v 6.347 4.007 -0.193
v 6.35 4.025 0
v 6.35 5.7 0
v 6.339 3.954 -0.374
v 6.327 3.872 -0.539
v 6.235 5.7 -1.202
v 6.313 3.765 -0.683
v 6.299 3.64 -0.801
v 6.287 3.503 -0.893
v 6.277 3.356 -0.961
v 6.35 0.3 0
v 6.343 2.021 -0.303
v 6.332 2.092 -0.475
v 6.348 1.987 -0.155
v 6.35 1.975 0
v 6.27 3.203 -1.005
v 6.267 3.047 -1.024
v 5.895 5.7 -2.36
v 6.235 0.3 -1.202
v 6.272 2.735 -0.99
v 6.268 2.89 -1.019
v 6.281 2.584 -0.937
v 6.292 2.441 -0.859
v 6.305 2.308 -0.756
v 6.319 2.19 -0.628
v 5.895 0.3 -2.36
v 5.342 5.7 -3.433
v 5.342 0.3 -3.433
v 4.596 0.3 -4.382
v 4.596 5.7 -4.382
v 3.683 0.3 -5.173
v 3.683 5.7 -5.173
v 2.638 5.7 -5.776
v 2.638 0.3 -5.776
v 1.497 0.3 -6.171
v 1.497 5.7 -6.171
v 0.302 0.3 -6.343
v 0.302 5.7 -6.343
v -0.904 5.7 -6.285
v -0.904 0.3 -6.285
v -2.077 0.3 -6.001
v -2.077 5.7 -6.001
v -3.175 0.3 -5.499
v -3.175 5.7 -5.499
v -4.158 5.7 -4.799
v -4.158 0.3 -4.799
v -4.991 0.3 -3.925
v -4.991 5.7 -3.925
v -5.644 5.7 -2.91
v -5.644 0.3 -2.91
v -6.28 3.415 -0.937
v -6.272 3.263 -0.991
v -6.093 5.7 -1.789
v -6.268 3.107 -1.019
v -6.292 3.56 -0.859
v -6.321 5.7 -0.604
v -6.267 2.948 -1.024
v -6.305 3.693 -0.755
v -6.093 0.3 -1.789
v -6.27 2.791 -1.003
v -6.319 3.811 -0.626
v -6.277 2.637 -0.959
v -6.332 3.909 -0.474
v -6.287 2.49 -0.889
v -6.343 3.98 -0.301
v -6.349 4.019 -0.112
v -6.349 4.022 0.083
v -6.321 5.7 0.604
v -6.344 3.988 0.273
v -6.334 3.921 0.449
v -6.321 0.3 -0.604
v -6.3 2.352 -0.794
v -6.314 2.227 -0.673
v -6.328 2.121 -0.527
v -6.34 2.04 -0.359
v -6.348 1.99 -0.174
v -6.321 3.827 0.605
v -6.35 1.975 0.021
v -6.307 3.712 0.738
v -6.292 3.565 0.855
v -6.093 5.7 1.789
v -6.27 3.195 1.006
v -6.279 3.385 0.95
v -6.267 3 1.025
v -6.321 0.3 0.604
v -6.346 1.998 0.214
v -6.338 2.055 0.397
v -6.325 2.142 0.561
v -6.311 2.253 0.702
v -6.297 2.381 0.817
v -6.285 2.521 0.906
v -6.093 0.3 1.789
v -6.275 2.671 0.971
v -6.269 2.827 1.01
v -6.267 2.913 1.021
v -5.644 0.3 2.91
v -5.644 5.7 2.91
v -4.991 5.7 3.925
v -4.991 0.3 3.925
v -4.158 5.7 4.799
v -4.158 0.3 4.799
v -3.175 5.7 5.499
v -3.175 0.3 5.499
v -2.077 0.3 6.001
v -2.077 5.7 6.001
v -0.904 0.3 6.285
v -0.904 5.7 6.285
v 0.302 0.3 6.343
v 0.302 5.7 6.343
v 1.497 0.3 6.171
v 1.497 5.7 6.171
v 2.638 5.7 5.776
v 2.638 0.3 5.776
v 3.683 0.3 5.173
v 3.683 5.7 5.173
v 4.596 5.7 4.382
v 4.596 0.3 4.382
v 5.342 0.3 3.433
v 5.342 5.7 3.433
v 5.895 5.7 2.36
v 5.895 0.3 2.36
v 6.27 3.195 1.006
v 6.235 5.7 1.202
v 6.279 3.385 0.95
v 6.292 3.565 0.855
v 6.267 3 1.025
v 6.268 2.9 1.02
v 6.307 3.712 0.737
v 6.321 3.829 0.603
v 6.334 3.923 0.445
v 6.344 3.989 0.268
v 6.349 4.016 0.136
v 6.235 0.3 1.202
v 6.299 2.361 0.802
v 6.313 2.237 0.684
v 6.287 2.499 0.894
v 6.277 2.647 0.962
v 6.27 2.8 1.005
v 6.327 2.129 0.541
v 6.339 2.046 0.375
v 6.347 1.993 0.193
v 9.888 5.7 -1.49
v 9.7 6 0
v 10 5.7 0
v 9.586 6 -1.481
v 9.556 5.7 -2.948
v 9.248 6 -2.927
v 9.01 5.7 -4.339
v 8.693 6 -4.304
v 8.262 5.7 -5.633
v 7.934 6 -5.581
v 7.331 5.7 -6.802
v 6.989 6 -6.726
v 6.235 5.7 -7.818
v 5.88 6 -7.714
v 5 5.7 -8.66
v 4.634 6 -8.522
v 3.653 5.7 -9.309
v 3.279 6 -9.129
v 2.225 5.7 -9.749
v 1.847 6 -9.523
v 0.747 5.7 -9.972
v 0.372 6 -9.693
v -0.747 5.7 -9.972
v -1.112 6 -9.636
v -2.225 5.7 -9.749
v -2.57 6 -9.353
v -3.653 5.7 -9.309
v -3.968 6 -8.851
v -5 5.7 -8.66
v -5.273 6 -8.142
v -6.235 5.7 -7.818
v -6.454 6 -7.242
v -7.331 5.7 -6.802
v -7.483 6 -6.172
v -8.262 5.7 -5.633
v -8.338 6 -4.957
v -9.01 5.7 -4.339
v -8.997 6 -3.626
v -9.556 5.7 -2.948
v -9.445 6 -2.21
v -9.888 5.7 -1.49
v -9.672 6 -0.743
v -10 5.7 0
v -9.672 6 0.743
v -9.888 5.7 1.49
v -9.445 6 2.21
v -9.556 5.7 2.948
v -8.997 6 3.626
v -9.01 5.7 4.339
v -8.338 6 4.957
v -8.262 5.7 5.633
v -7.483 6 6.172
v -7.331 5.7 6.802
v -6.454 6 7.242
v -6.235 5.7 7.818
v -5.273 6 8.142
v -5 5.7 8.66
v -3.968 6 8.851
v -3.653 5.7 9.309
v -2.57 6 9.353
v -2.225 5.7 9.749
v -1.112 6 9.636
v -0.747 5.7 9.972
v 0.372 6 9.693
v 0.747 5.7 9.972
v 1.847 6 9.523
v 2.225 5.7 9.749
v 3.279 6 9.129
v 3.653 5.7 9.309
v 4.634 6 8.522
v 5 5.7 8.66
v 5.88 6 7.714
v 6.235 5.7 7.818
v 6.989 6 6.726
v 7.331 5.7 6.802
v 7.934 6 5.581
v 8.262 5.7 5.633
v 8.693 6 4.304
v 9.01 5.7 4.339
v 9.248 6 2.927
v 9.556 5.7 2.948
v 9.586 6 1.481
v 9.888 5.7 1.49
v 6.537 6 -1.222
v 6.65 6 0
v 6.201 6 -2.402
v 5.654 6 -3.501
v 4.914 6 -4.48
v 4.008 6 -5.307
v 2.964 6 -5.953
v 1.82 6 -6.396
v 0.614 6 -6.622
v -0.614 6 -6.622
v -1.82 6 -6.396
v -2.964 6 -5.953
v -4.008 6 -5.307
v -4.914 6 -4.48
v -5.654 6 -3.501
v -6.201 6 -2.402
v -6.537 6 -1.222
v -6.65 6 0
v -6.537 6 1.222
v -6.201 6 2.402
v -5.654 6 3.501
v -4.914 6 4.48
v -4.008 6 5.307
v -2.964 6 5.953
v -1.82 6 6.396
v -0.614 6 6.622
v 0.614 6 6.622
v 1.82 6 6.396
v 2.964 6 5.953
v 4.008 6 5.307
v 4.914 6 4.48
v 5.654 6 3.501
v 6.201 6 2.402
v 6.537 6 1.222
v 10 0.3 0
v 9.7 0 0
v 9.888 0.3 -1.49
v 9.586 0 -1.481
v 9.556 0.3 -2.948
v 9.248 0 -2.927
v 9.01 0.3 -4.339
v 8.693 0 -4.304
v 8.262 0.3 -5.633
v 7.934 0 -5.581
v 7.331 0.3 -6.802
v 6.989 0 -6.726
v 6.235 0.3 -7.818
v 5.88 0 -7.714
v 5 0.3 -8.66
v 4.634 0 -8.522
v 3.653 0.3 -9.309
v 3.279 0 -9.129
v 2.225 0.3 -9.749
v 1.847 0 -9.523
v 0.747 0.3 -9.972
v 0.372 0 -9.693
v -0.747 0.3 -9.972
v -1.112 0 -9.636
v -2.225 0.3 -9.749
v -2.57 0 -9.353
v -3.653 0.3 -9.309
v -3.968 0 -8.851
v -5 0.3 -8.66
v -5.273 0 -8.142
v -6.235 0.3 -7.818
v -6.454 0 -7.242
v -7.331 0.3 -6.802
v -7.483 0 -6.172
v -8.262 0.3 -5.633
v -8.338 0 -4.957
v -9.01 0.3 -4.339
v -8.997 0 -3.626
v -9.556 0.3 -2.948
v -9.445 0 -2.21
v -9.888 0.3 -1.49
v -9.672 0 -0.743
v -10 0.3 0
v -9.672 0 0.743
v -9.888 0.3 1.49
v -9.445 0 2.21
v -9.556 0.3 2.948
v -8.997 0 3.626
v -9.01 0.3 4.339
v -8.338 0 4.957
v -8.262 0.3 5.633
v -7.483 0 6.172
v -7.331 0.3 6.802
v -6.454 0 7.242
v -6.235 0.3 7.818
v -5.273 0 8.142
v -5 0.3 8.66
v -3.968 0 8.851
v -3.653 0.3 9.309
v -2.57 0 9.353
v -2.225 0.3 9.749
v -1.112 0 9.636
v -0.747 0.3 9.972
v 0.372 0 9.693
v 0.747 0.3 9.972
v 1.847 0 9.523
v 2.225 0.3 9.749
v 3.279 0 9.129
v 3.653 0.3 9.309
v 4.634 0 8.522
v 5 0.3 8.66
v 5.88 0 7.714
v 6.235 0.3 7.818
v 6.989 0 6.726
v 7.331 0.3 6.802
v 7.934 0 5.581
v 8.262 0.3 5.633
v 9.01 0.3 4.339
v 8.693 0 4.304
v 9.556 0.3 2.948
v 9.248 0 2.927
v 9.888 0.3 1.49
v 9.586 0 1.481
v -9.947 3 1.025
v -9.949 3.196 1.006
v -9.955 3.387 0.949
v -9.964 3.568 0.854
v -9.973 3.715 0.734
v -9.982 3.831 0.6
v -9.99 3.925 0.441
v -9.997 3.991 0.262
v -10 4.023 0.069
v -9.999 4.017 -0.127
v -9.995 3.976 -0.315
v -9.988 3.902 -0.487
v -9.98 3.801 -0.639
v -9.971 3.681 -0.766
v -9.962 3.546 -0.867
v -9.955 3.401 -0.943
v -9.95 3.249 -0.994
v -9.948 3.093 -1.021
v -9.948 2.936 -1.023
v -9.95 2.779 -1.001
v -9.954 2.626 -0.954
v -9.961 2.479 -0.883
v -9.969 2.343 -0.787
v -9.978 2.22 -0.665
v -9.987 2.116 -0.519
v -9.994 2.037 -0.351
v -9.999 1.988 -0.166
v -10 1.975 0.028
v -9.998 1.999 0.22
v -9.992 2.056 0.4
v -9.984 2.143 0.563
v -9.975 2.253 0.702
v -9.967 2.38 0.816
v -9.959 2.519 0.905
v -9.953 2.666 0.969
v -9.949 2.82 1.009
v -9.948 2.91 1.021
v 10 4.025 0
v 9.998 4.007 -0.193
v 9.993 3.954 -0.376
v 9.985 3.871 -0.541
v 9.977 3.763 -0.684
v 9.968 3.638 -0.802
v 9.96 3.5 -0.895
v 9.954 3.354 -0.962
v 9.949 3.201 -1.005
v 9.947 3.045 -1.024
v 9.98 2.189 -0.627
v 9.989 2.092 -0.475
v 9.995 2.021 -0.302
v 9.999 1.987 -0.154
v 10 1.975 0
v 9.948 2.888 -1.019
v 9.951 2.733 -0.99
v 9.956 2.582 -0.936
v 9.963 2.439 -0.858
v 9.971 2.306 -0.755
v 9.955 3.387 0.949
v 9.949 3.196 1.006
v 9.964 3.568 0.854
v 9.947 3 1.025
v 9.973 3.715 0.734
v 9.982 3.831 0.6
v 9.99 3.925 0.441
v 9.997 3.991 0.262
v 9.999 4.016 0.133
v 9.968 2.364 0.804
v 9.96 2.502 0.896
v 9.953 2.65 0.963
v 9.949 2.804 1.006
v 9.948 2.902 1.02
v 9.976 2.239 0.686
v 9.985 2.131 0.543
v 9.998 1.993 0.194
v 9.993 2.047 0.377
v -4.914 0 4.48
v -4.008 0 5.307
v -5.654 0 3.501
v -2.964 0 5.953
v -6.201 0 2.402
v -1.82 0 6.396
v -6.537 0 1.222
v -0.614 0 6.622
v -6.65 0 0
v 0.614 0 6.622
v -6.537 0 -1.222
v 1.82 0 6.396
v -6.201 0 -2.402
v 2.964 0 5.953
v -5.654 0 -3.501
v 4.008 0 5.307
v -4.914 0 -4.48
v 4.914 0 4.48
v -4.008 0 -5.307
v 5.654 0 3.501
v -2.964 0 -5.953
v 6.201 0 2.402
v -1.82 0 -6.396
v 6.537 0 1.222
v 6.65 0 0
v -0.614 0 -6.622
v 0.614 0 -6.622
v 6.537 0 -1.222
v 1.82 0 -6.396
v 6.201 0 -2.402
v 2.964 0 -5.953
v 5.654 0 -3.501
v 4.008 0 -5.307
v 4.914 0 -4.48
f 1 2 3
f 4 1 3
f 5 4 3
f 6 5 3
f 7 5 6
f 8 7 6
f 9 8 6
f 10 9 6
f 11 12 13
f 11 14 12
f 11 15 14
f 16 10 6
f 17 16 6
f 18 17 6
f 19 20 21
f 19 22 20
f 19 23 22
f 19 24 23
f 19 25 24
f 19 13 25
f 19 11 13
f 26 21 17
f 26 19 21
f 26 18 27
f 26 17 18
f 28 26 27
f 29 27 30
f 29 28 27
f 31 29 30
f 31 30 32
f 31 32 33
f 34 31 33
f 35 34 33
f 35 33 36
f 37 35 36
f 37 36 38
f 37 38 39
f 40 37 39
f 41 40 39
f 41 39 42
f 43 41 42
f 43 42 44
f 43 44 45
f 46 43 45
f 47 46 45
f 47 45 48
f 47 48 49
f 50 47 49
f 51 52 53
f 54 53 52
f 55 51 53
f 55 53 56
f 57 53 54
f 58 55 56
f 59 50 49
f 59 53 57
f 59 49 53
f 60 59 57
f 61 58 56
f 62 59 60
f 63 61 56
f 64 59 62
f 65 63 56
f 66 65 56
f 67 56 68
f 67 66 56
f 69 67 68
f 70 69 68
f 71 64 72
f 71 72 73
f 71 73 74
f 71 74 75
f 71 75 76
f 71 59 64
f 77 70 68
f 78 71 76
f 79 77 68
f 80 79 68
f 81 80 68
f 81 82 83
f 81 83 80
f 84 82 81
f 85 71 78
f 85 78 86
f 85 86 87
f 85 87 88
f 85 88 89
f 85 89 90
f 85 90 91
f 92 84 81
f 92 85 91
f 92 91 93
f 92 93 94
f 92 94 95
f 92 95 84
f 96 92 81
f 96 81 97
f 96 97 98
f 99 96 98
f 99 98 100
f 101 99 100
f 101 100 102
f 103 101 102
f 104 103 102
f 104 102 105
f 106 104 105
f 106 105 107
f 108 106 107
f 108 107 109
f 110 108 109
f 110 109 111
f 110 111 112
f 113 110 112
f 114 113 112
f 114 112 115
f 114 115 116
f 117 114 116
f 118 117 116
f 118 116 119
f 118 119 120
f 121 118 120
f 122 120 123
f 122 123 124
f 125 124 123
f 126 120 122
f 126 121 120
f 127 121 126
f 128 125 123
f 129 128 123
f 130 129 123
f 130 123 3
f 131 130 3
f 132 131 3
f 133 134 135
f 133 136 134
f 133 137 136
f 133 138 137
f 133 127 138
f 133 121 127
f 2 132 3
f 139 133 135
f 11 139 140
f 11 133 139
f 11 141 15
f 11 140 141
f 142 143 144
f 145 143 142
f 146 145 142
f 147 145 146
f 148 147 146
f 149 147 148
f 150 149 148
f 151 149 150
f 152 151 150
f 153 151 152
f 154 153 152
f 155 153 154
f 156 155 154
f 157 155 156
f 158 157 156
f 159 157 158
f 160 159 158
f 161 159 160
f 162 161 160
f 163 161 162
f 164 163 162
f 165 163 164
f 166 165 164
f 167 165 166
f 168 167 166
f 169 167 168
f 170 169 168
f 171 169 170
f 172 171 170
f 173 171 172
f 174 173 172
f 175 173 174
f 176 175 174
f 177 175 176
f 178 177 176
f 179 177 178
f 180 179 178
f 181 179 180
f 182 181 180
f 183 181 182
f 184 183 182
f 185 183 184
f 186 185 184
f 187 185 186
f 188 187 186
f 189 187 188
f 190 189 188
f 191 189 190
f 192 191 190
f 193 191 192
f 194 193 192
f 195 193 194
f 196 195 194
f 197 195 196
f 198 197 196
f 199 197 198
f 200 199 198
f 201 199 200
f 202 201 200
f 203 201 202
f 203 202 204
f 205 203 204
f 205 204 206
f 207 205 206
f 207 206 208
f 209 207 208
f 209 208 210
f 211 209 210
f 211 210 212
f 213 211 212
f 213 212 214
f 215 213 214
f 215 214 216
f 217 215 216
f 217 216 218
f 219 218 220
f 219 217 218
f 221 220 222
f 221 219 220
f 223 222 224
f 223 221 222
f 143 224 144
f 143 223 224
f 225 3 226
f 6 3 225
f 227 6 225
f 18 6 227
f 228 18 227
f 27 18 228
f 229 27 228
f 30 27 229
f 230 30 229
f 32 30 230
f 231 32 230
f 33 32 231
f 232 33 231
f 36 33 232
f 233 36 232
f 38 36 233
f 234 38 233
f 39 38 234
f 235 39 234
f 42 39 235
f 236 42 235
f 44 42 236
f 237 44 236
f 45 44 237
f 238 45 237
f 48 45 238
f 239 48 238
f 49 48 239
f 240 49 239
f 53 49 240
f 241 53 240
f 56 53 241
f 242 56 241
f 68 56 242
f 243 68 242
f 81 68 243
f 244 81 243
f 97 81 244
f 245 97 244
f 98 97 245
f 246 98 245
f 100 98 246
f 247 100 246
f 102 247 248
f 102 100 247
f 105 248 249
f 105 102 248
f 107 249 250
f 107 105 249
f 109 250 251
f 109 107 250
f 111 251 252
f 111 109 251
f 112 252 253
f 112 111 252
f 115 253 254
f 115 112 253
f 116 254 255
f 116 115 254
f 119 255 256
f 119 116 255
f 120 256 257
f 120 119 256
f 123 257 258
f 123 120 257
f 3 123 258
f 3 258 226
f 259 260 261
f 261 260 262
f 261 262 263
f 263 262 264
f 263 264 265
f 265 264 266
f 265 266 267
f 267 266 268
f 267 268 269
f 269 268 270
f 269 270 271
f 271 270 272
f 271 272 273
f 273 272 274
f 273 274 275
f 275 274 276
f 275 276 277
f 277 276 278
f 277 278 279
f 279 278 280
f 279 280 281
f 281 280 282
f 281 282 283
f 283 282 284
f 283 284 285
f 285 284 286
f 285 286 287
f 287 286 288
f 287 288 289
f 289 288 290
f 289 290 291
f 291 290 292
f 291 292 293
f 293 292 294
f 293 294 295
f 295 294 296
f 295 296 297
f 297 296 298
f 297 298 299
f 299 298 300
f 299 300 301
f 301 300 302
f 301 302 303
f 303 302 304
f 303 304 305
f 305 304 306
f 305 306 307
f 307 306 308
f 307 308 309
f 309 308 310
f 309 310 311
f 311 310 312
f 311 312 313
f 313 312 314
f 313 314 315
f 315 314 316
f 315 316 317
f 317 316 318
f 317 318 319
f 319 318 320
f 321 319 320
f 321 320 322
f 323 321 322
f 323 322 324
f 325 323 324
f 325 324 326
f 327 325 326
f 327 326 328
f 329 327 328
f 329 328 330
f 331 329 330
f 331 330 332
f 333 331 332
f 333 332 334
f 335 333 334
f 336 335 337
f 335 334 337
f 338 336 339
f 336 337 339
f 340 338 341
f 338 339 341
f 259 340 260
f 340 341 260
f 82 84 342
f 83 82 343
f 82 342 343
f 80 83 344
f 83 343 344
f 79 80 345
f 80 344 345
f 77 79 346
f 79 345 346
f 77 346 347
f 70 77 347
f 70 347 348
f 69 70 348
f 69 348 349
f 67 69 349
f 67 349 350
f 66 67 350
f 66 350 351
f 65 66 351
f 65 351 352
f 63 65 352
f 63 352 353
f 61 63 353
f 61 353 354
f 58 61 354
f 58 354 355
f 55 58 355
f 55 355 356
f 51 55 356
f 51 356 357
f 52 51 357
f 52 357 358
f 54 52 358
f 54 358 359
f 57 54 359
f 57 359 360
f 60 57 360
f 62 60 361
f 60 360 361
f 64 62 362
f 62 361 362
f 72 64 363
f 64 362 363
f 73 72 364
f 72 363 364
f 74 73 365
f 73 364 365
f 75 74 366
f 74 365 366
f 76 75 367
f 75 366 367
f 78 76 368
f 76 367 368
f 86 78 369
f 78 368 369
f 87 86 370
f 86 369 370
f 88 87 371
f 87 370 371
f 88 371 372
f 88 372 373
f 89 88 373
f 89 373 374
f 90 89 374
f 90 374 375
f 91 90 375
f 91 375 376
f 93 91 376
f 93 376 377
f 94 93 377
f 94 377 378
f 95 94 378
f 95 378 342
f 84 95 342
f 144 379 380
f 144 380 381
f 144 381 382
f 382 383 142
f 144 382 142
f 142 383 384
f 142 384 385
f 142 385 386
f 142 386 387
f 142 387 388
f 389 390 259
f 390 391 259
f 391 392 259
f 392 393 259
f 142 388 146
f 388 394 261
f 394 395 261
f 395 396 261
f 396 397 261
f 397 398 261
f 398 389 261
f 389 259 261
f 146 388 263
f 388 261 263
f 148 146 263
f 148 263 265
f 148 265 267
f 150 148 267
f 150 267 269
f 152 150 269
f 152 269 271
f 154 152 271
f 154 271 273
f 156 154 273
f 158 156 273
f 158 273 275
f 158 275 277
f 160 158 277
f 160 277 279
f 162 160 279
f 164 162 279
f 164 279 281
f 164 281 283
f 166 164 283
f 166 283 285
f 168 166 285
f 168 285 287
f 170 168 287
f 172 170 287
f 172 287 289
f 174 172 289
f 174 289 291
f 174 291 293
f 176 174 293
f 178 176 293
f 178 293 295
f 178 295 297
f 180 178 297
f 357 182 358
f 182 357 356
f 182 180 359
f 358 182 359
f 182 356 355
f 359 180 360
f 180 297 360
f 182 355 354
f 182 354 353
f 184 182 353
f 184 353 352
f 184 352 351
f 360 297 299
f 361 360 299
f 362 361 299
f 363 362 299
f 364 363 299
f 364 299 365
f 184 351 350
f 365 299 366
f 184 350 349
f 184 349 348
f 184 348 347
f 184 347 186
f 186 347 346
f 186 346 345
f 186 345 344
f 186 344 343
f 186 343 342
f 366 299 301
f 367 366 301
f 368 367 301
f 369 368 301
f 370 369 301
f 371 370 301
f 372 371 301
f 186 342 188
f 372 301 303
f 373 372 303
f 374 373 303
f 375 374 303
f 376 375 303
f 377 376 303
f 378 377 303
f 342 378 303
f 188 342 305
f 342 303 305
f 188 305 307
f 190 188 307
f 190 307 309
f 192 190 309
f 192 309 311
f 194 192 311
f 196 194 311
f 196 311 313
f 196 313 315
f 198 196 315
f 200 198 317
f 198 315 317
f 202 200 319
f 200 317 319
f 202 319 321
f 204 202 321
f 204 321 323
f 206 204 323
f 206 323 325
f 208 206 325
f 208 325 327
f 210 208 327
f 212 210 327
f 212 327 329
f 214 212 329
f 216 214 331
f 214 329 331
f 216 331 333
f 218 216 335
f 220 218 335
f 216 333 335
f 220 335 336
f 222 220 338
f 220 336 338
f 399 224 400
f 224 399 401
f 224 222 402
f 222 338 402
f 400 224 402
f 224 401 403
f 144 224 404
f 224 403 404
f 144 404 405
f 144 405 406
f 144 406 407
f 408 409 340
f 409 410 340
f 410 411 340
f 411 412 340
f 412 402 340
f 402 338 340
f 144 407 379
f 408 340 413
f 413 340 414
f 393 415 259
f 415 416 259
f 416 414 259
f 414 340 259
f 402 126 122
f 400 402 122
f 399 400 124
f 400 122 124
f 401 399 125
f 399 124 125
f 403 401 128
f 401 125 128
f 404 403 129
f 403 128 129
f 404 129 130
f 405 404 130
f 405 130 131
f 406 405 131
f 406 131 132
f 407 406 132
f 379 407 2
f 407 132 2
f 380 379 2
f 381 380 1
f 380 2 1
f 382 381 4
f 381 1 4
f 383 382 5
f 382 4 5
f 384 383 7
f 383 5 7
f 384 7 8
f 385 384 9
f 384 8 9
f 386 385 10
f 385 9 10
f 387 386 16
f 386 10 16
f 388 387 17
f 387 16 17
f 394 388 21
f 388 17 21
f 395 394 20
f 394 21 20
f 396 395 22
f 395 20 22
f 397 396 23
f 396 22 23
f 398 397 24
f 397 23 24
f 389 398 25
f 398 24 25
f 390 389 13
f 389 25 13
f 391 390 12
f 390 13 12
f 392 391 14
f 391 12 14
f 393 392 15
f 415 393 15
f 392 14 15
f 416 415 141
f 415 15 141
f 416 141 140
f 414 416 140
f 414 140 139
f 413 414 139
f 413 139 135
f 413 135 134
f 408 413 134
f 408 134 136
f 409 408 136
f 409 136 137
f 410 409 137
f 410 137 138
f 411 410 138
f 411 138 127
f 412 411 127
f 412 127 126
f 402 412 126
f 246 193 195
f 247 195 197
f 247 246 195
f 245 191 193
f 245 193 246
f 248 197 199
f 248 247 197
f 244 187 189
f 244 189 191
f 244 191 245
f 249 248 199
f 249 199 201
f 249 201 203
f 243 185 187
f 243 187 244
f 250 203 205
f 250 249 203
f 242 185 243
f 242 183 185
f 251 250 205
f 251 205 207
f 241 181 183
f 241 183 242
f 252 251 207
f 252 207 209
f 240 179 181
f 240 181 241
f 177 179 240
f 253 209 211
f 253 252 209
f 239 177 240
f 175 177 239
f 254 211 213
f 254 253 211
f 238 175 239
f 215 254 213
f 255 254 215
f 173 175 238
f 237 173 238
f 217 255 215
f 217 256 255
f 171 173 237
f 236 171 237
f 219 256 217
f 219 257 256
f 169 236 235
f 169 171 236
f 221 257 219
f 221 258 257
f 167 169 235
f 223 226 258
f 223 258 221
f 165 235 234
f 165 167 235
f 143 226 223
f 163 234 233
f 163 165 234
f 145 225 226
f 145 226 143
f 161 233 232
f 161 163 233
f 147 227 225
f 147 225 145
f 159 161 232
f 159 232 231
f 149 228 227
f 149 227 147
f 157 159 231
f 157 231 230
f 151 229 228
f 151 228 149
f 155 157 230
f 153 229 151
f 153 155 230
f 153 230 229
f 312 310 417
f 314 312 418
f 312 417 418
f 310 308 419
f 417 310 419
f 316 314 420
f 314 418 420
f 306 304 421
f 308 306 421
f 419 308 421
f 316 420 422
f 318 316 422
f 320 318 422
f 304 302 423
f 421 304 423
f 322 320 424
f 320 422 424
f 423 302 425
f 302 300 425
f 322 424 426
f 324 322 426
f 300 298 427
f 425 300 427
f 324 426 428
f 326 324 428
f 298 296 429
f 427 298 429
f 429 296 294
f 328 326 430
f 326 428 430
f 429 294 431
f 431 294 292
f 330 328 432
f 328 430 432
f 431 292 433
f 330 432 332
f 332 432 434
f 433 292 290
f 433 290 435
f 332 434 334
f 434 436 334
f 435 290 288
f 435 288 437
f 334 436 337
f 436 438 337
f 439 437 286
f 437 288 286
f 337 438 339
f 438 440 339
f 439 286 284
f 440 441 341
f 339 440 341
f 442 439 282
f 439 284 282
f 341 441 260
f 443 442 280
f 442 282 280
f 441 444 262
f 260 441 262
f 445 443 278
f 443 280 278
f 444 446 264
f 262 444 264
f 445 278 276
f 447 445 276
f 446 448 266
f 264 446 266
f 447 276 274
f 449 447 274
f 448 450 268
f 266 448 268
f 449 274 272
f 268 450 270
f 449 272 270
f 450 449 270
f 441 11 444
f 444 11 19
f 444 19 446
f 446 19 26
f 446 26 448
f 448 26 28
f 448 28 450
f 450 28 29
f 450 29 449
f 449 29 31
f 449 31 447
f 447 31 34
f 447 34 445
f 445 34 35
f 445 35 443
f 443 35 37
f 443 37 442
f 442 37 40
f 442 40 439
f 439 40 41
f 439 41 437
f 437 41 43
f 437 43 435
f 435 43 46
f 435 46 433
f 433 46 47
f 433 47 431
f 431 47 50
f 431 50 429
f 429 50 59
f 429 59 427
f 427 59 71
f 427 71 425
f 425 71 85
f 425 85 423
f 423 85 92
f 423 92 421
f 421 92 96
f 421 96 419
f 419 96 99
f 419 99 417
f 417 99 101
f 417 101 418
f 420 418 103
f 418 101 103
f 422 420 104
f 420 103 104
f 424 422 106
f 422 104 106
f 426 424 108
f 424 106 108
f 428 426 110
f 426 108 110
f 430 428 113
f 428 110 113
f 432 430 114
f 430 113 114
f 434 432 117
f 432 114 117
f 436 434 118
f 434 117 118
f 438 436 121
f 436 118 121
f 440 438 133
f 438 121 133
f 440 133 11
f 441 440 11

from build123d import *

# Parameters (mm, degrees)
SKETCH1_R                = 10
SKETCH1_R_2              = 6.35
BOSS_EXTRUDE1_DEPTH      = 6
M2_5X0_45_TAPPED_HOLE1_D = 2.05
CHAMFER1_SIZE            = 0.3


with BuildPart() as part:
    # Sketch1 → Boss-Extrude1 (new body)
    with BuildSketch(Plane(origin=(0, 0, 0), x_dir=(1, 0, 0), z_dir=(0, 1, 0))):
        Circle(SKETCH1_R)
        Circle(SKETCH1_R_2, mode=Mode.SUBTRACT)
    extrude(amount=BOSS_EXTRUDE1_DEPTH)

    # M2.5x0.45 Tapped Hole1 (through all)
    with Locations(Plane(origin=(10, 0, 0), x_dir=(0, 0, -1), z_dir=(1, 0, 0))):
        with Locations((0, 3)):
            Hole(M2_5X0_45_TAPPED_HOLE1_D / 2)

    # Chamfer1
    chamfer1_edges = [part.edges().sort_by_distance(p)[0] for p in [
        (-10, 0, 0),
        (-10, 6, 0),
        (-6.35, 0, 0),
        (-6.35, 6, 0),
    ]]
    chamfer(chamfer1_edges, length=CHAMFER1_SIZE)


solid = part.part
